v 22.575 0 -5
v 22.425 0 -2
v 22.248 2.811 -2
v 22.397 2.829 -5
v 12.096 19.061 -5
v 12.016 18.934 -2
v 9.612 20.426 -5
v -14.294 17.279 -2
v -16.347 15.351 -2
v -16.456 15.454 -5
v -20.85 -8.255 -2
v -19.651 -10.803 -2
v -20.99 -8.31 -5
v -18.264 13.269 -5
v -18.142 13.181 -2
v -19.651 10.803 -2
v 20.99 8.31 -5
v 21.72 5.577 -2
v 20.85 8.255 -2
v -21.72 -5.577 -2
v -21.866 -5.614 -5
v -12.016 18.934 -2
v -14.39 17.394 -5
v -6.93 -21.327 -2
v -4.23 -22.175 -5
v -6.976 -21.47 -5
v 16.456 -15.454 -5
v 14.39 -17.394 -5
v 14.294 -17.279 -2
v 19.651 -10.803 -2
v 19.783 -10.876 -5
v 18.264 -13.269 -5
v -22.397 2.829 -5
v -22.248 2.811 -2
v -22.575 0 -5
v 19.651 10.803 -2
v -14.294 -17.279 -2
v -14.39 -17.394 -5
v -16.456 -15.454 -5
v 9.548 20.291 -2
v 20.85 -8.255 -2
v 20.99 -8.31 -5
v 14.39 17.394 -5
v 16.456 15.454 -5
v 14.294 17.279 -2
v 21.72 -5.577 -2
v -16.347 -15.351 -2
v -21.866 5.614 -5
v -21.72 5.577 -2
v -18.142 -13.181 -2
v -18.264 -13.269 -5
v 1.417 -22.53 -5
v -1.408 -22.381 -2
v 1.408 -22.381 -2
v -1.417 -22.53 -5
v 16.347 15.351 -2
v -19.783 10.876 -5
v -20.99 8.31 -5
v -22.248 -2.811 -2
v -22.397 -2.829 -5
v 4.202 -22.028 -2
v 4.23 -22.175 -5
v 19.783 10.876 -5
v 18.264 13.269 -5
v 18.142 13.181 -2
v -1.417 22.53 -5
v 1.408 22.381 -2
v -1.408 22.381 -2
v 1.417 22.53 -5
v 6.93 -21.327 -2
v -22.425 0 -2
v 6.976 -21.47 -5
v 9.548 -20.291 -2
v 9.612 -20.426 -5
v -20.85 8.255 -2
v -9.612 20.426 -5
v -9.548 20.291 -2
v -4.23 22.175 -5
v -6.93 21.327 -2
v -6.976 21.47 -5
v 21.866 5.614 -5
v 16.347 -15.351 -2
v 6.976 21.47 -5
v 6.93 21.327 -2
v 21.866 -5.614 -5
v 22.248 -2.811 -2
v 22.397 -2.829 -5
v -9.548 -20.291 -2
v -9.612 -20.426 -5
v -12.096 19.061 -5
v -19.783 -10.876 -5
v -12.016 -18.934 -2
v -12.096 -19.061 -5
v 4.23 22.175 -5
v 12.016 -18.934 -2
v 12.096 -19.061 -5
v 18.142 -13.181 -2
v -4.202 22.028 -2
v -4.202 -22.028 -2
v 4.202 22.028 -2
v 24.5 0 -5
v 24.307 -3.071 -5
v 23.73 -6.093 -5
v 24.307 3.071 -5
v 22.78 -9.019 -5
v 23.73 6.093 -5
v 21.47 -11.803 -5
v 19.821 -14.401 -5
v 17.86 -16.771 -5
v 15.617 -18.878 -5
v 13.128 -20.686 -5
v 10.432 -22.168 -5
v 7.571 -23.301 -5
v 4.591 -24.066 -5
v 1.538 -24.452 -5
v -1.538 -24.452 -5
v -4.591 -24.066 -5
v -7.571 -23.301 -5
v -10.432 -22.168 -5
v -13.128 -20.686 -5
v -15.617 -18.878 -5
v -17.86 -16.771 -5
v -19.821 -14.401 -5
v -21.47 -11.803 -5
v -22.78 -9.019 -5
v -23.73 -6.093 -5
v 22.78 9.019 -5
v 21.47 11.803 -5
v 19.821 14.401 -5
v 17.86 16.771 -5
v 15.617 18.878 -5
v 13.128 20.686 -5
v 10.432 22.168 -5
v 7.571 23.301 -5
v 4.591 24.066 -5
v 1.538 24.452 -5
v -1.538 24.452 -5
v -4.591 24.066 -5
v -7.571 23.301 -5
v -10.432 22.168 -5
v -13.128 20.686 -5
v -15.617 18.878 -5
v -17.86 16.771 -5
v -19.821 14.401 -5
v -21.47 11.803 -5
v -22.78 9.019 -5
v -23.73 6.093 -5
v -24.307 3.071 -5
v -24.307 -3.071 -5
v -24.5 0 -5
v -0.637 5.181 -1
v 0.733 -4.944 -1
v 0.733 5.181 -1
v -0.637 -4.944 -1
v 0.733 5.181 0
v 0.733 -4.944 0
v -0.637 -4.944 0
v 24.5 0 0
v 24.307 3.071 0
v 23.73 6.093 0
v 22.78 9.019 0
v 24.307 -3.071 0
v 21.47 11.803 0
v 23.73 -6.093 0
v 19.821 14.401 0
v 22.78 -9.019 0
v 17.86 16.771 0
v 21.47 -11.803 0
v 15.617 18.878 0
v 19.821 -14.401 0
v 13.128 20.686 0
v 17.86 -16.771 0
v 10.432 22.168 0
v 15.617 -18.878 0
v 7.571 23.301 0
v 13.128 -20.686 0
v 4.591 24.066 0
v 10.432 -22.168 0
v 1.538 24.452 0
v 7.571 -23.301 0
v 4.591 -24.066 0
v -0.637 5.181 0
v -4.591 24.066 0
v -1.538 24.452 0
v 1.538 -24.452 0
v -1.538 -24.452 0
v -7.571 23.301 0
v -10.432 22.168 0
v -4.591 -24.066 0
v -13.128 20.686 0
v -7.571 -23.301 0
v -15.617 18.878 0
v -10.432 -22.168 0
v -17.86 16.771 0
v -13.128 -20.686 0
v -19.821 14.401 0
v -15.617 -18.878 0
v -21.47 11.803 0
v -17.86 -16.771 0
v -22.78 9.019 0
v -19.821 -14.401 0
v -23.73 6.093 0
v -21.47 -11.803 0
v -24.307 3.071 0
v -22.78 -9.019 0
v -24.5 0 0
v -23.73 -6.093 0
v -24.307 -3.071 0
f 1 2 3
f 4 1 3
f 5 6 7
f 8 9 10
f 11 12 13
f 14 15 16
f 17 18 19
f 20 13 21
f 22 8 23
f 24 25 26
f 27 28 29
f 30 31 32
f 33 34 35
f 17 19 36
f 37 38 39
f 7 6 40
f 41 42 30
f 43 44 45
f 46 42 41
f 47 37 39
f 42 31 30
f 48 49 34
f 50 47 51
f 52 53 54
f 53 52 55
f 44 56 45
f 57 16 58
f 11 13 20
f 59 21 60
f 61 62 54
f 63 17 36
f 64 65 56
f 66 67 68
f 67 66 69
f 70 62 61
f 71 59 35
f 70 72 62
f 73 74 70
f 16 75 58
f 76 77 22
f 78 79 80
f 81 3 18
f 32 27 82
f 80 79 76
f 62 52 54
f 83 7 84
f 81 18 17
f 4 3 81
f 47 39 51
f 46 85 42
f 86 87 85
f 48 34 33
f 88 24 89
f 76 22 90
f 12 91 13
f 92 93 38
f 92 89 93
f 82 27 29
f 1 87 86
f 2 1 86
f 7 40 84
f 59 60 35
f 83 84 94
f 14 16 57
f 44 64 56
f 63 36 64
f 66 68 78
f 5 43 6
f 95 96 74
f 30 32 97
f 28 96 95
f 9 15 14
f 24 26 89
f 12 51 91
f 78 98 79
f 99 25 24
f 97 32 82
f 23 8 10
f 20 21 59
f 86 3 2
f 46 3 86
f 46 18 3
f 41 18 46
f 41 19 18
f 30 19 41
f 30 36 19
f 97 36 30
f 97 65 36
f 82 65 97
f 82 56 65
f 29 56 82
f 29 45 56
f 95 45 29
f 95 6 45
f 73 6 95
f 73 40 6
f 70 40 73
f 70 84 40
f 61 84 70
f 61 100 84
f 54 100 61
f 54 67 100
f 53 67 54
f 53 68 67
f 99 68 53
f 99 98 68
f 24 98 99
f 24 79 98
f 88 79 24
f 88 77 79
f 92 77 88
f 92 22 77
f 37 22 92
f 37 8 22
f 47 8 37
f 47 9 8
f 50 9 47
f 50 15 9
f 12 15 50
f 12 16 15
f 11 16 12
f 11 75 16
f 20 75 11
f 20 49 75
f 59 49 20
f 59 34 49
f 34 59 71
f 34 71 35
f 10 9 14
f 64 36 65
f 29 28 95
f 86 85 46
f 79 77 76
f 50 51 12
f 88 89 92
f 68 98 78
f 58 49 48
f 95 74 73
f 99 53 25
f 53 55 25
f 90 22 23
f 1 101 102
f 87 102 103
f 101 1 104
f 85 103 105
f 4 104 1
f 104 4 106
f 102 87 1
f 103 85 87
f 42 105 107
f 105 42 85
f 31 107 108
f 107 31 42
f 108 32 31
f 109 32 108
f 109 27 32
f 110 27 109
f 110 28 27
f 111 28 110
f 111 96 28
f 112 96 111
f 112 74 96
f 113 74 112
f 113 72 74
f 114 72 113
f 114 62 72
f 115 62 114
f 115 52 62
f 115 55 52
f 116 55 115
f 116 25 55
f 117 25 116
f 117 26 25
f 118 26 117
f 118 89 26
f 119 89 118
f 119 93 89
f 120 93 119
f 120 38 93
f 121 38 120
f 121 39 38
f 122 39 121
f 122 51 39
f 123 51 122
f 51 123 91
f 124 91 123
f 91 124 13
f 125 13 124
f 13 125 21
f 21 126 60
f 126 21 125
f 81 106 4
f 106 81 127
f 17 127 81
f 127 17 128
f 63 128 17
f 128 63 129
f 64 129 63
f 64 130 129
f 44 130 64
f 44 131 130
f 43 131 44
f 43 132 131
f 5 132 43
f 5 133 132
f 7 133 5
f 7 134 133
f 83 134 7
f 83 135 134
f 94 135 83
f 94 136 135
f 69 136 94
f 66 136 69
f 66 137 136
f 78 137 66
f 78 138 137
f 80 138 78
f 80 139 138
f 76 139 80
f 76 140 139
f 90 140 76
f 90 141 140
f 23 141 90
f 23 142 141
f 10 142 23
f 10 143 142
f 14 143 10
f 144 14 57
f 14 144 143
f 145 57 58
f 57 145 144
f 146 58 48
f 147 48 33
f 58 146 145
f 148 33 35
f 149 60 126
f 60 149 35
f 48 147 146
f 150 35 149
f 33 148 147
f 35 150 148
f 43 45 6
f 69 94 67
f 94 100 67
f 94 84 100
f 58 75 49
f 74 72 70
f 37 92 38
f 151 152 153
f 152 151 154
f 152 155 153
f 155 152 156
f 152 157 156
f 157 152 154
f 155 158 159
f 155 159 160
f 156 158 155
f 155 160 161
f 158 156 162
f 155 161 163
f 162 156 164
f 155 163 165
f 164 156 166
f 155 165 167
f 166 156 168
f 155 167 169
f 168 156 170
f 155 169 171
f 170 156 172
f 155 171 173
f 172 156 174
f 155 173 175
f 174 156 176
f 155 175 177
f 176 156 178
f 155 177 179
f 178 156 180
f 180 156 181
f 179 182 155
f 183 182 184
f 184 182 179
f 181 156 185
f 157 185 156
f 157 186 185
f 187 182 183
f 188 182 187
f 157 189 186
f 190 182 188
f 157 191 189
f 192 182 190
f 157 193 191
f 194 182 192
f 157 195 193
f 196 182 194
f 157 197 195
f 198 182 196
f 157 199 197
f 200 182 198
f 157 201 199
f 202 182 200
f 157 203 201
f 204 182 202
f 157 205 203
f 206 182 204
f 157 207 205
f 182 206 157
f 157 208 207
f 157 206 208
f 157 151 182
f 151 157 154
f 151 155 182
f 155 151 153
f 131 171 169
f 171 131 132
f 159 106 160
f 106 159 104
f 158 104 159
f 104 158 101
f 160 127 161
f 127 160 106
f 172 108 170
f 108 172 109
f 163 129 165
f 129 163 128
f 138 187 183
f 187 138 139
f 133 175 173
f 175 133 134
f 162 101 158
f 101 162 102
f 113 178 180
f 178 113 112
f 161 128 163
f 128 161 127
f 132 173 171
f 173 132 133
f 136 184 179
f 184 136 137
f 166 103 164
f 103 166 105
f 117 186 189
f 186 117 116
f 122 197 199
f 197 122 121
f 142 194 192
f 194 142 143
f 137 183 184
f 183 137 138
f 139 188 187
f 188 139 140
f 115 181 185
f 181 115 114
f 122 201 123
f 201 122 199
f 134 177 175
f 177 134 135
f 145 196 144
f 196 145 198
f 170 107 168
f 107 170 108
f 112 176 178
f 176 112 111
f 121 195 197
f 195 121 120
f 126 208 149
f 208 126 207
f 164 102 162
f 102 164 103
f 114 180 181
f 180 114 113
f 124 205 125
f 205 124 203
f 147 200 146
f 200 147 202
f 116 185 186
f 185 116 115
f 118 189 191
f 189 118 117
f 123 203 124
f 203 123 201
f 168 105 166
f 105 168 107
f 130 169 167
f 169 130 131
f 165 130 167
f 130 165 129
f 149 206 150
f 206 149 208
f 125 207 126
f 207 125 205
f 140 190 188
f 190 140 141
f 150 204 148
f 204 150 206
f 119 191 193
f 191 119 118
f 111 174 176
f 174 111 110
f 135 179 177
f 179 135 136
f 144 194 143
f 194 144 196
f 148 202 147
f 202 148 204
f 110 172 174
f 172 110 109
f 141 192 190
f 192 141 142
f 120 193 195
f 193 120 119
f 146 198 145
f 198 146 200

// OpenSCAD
$fn = 50;

difference() {
	union() {
		translate(v = [0, 0, -5.0]) {
			cylinder(h = 5, r = 24.5);
		}
	}
	union() {
		#translate(v = [0, 0, -5.0]) {
			cylinder(h = 3, r1 = 22.575, r2 = 22.425);
		}
		translate(v = [0, 0, -1]) {
			linear_extrude(height = 1) {
				text(font = "Impact", halign = "center", size = 10, text = "I", valign = "center");
			}
		}
	}
}
